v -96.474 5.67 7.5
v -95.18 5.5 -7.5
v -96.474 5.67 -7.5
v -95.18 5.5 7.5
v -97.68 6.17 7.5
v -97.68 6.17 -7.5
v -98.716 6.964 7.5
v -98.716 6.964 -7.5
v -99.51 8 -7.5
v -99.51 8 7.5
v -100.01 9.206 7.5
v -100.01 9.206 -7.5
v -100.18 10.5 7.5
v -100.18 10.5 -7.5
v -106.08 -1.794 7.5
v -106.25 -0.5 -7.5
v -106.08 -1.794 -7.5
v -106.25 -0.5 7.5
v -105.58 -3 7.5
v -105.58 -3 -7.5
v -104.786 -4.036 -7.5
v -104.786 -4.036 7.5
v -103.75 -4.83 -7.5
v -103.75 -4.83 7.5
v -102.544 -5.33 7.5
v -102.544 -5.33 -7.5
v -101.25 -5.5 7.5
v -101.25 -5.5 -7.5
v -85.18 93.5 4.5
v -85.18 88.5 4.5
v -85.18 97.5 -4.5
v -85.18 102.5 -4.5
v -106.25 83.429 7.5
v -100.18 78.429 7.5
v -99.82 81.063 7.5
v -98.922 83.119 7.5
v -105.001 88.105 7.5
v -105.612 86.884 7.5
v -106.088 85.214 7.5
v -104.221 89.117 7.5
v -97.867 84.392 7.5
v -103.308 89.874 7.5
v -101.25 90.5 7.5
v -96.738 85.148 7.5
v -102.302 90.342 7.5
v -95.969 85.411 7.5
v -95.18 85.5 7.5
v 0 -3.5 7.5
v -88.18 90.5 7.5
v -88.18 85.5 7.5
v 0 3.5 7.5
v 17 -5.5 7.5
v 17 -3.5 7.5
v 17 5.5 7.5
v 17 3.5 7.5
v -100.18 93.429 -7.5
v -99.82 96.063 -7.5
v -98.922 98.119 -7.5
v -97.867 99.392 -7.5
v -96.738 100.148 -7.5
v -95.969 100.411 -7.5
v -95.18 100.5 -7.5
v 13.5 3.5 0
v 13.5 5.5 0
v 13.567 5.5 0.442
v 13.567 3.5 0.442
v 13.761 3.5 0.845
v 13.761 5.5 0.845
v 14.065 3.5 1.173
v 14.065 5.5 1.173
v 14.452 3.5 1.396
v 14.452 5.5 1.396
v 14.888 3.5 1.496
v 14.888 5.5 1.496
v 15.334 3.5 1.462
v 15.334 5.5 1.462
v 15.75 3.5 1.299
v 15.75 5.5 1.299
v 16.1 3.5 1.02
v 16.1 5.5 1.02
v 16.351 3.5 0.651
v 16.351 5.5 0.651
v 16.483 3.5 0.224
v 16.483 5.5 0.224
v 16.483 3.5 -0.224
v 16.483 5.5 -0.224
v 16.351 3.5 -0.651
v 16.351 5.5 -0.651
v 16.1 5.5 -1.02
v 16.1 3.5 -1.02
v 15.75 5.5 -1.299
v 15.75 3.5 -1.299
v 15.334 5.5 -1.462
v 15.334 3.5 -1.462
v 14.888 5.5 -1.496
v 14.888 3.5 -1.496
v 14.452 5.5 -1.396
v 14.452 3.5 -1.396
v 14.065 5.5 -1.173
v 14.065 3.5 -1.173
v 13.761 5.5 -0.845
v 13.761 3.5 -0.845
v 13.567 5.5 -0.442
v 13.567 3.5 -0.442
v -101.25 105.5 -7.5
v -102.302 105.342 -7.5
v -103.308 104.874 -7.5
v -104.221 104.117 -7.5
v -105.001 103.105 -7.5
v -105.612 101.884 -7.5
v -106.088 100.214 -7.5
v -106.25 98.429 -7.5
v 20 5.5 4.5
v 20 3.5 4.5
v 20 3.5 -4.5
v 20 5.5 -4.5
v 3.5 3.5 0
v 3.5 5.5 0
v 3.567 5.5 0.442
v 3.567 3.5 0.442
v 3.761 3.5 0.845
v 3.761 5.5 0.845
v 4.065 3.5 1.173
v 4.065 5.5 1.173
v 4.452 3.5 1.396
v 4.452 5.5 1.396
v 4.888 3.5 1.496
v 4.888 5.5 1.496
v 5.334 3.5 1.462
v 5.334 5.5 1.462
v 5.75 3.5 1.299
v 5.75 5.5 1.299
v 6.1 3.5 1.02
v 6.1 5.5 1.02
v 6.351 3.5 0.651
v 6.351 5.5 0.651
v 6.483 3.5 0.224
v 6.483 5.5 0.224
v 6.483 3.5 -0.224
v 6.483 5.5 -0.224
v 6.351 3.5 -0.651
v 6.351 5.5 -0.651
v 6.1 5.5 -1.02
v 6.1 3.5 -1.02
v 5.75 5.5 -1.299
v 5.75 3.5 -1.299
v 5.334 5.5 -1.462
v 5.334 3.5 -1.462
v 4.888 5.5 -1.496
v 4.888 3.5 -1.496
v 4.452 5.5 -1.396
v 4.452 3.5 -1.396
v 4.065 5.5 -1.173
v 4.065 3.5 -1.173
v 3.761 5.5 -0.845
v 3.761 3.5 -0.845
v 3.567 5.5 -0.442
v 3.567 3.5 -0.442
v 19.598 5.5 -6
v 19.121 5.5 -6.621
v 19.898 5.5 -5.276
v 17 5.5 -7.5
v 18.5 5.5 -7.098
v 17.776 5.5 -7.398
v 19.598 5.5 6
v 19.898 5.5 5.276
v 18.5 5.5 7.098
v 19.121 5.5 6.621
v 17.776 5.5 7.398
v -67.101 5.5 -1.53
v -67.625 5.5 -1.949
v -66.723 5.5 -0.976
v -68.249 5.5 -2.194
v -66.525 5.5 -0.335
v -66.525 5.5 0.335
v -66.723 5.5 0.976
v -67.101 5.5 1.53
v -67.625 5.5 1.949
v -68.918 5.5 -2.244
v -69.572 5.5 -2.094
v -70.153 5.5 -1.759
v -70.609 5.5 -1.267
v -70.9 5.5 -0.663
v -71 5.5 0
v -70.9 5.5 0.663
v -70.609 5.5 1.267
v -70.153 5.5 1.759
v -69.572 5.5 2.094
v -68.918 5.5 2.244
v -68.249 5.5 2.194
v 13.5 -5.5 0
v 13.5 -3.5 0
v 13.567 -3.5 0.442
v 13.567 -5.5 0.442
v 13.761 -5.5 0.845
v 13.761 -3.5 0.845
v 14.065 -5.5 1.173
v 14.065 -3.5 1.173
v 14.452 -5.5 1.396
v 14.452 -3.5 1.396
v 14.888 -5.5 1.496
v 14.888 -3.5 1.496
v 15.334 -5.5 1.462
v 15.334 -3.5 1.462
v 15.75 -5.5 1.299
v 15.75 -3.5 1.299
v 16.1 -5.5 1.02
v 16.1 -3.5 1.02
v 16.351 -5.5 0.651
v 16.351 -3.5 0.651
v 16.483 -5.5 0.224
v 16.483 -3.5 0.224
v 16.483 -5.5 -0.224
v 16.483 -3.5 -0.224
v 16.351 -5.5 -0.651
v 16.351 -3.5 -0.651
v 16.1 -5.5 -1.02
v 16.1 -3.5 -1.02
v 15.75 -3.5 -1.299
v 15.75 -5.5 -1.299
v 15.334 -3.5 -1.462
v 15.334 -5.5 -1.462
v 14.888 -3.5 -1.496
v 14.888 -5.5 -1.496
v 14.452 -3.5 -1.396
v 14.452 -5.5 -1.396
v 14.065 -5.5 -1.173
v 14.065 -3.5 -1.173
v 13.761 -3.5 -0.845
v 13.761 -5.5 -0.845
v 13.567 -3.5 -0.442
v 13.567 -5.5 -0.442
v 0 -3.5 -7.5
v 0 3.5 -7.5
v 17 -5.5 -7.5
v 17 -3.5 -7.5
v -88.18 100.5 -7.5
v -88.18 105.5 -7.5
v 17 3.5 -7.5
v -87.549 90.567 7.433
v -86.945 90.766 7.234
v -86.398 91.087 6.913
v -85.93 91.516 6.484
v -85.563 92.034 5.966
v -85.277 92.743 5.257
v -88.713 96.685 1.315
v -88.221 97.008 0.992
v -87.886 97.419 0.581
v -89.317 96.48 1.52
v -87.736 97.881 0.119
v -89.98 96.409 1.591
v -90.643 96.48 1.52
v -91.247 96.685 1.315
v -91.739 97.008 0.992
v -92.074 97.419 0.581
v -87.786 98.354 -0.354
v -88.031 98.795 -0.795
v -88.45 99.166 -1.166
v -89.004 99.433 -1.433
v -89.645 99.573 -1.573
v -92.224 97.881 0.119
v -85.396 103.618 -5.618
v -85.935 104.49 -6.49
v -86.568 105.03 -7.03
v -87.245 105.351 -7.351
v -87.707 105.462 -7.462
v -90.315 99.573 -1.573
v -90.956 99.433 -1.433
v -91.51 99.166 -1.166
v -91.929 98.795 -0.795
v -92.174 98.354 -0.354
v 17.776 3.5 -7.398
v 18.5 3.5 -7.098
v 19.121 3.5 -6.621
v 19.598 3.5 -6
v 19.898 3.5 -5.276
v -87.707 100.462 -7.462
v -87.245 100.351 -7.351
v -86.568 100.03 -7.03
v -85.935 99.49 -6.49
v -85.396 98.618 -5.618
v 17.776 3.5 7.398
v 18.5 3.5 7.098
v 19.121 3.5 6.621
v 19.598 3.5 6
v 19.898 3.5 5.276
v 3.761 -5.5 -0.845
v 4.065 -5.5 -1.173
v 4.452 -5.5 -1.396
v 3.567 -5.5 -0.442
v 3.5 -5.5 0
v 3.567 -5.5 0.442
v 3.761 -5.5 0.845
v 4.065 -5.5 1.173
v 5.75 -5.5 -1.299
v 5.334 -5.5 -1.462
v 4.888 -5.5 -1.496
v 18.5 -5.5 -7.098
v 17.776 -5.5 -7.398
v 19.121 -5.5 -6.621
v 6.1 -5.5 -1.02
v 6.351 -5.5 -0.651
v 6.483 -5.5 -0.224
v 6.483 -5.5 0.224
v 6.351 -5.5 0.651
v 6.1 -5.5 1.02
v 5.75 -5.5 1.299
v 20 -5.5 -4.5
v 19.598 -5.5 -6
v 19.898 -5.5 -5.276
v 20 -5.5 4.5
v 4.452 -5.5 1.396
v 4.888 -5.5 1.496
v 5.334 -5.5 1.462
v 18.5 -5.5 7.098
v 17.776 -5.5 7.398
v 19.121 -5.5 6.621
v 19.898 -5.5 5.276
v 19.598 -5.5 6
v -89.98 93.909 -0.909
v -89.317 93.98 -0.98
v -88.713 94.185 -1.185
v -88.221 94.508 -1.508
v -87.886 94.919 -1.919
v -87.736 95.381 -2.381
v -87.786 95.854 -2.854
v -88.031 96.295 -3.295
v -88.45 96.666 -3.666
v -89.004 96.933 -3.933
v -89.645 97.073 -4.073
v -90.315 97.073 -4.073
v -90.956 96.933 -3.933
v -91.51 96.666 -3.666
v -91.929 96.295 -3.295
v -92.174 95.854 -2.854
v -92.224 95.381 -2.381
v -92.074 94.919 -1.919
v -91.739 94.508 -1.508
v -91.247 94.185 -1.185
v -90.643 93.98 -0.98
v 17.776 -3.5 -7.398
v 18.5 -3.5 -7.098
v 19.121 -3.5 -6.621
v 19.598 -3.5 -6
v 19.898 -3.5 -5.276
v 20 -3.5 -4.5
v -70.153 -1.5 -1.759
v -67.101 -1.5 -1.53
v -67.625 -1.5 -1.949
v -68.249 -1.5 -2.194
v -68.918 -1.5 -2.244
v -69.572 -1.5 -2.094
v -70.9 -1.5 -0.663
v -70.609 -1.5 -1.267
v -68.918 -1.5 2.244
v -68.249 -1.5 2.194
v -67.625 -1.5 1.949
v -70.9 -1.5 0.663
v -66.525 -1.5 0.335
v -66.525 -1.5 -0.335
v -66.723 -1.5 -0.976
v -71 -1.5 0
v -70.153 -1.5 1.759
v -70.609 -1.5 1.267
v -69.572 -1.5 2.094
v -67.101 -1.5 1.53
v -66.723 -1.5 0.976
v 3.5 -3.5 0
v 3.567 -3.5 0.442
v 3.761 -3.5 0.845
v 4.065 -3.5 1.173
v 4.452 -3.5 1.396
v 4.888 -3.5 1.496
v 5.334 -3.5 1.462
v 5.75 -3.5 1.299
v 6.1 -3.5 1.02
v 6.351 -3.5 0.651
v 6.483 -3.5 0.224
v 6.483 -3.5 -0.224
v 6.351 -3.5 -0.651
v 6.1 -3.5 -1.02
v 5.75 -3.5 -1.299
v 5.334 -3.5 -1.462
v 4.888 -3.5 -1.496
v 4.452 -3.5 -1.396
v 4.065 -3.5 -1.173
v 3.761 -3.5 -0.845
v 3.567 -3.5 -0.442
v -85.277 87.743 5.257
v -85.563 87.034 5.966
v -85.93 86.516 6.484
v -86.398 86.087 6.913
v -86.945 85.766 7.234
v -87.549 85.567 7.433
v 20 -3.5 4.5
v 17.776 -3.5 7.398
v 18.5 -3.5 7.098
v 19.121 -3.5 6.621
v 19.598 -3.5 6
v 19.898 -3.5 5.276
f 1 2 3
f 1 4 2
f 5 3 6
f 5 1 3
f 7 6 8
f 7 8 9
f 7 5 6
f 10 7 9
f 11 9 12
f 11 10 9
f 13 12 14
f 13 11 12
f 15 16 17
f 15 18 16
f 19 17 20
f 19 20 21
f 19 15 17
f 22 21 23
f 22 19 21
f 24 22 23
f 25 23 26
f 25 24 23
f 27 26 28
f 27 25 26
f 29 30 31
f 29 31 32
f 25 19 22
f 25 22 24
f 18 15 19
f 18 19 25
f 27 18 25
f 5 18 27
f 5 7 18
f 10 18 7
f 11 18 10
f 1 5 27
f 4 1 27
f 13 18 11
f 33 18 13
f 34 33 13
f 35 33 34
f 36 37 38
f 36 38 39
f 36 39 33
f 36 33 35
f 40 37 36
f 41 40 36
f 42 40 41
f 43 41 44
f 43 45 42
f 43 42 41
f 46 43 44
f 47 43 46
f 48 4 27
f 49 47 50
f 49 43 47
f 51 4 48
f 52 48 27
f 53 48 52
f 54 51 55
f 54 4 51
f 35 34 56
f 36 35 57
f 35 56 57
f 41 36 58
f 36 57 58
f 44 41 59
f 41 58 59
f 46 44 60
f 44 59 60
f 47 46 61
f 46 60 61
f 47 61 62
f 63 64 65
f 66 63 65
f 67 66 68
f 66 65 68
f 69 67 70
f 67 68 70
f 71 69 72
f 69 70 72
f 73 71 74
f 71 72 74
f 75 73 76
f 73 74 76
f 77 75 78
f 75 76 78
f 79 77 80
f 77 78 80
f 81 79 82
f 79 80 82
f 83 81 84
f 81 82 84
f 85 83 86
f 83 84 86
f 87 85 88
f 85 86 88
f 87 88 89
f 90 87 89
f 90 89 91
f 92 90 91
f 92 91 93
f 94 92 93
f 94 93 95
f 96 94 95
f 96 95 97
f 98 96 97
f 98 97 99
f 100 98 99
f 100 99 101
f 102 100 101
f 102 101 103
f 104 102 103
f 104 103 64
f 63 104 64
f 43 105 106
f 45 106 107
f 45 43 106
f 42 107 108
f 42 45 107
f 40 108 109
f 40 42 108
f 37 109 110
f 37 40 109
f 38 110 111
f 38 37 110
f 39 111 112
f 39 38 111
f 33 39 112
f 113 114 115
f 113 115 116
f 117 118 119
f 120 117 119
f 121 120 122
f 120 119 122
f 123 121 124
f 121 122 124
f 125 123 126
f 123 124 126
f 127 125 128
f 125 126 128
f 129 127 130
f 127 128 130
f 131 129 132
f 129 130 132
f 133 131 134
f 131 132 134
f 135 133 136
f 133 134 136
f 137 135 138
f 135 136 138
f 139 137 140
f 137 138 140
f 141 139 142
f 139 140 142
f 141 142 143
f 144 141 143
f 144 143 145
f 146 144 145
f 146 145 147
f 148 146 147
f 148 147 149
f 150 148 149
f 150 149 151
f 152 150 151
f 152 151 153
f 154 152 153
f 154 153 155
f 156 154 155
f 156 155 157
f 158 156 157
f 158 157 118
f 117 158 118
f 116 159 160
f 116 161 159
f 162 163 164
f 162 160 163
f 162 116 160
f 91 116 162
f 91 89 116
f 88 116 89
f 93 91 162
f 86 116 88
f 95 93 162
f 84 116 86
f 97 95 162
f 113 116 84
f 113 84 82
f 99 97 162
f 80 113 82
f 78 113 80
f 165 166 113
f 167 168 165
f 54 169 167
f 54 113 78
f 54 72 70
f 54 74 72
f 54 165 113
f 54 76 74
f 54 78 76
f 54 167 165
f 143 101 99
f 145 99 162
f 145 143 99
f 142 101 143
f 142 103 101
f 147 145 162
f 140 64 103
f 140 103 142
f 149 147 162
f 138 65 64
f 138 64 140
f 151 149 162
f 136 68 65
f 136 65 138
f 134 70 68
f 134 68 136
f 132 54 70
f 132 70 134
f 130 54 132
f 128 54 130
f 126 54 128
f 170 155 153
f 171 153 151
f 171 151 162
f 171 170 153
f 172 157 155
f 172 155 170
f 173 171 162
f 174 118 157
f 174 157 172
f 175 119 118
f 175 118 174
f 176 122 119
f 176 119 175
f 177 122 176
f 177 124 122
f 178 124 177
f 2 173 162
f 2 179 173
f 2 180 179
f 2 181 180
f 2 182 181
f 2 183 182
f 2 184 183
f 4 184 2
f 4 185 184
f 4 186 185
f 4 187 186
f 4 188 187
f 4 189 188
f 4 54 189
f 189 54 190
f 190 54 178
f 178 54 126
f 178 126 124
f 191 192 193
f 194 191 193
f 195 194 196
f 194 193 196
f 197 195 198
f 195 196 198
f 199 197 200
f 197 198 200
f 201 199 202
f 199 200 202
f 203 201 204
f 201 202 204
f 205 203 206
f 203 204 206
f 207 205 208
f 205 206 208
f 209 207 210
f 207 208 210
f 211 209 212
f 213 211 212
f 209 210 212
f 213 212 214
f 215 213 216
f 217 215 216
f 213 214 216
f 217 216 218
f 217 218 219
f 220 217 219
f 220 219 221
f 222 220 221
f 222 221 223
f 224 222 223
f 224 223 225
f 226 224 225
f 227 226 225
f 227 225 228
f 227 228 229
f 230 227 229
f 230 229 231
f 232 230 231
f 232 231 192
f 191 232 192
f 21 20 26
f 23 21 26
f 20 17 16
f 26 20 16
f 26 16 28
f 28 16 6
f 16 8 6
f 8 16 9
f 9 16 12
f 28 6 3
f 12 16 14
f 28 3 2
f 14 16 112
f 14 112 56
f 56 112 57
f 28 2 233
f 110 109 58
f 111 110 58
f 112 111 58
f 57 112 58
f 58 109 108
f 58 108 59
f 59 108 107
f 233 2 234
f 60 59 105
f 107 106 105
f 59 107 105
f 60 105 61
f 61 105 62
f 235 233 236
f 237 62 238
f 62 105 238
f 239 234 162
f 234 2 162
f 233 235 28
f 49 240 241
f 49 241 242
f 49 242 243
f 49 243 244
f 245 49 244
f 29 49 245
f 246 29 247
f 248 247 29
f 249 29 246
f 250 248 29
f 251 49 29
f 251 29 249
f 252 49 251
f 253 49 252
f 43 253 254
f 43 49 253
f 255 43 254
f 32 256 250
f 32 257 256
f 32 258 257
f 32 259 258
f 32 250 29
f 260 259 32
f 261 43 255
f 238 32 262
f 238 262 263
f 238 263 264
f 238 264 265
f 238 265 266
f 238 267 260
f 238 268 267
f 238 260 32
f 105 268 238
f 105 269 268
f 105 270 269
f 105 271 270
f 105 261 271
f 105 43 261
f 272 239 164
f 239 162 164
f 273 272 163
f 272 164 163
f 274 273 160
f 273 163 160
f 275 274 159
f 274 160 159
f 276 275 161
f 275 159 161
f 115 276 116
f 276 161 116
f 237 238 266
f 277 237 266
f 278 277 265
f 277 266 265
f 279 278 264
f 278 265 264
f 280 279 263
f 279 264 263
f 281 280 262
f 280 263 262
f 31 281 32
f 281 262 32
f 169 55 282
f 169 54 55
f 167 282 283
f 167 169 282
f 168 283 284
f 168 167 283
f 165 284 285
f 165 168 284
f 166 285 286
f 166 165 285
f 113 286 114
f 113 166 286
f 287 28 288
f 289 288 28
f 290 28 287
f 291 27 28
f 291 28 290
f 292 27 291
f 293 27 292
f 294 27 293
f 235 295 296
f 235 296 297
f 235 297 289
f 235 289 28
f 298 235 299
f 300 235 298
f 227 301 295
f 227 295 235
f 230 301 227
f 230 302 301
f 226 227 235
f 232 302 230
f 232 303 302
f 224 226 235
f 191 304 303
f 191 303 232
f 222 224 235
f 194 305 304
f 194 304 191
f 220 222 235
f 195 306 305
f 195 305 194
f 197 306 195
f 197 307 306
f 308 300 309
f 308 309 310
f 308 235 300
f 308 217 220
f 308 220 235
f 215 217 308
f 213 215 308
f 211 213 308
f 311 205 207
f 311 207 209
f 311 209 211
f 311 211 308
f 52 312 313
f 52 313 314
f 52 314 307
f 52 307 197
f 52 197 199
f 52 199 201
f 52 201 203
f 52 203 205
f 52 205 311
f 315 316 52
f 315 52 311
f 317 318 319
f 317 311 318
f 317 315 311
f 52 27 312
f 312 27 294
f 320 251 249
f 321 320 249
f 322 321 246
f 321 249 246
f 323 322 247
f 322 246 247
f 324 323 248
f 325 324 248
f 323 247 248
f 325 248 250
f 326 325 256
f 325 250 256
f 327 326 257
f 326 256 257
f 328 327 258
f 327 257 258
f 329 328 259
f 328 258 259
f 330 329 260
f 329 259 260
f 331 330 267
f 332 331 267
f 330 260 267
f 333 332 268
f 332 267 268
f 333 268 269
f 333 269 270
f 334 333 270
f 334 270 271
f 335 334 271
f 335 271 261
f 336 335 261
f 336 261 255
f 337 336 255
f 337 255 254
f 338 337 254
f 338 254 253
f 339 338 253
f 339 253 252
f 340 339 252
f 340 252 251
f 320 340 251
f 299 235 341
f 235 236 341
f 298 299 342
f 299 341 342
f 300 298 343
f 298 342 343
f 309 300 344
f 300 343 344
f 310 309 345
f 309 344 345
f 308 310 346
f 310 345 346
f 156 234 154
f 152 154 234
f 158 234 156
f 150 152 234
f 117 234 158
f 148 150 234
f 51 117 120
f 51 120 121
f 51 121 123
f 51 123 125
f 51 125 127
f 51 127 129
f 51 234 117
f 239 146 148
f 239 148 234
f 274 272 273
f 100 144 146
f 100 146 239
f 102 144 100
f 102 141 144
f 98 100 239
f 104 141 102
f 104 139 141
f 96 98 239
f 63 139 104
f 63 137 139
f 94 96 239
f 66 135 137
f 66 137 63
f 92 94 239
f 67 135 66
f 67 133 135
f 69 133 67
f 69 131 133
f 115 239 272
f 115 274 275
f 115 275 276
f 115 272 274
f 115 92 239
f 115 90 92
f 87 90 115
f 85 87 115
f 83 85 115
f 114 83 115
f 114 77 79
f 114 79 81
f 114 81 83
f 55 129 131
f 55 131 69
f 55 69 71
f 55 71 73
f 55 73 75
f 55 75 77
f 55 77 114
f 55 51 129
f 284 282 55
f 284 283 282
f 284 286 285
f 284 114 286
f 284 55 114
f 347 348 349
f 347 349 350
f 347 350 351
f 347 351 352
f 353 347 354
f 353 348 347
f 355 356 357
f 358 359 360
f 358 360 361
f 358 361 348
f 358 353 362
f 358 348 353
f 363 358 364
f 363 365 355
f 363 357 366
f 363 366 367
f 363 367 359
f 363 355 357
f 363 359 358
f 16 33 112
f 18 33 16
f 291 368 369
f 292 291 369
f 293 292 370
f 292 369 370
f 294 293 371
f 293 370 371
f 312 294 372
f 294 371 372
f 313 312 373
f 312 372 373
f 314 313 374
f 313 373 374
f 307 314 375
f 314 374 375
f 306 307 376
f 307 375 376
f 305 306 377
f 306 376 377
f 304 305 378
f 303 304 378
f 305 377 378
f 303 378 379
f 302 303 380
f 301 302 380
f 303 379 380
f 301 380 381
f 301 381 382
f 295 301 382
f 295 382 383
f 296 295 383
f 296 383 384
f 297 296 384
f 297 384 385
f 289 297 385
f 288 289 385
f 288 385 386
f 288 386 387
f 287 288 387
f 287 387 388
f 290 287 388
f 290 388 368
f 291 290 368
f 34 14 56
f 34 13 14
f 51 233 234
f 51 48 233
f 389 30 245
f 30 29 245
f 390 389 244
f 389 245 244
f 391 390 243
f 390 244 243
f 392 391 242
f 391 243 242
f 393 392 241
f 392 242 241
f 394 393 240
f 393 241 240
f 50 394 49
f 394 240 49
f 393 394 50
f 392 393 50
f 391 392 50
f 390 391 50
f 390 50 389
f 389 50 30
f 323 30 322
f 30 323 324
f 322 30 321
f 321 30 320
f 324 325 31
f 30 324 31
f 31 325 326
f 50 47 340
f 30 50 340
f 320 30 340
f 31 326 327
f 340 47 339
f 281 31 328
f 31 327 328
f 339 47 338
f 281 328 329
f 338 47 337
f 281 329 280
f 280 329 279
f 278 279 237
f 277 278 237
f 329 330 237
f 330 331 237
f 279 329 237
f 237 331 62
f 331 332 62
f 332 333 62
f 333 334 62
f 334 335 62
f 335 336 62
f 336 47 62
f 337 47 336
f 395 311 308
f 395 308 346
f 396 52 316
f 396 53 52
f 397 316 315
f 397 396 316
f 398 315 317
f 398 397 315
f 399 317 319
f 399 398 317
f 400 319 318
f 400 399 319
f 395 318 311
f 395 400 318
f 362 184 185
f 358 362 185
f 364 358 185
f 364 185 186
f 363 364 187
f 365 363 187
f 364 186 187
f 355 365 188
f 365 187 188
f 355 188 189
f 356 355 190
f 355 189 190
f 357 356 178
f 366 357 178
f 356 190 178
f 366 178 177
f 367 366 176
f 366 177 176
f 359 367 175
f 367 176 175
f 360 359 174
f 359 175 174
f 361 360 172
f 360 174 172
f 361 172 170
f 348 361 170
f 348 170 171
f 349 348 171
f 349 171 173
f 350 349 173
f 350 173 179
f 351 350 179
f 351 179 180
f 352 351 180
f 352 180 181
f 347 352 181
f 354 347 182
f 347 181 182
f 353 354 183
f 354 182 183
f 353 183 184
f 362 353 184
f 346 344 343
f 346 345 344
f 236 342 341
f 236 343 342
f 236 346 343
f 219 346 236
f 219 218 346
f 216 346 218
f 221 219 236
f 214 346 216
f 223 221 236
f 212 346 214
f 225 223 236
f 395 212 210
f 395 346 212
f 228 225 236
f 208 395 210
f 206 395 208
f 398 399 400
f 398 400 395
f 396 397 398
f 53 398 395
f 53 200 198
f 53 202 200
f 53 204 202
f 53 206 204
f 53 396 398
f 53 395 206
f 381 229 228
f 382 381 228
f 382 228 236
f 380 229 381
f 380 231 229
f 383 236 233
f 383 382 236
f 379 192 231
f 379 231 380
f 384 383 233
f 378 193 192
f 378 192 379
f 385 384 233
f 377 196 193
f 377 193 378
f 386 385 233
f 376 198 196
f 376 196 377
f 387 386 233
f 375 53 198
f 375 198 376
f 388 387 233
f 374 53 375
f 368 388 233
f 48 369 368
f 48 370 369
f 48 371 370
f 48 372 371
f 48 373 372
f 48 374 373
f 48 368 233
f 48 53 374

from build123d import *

# Parameters (mm, degrees)
SALIENTE_EXTRUIR1_DEPTH = 7.5
CROQUIS2_R              = 1.5
CORTAR_EXTRUIR1_DEPTH   = 147.100350787
REDONDEO1_R             = 3
REDONDEO2_R             = 3
CORTAR_EXTRUIR3_DEPTH   = 161.092886788
CROQUIS5_R              = 2.25
CORTAR_EXTRUIR4_DEPTH   = 133.941951618
CORTAR_EXTRUIR5_DEPTH   = 161.092886788
CROQUIS7_R              = 2.25
CORTAR_EXTRUIR6_DEPTH   = 7
REDONDEO3_R             = 5


with BuildPart() as part:
    # Croquis1 → Saliente-Extruir1 (new, symmetric)
    with BuildSketch(Plane.XY):
        Polygon((0, -3.5), (0, 3.5), (20, 3.5), (20, 5.5), (-100.18, 5.5), (-100.18, 85.5), (-85.18, 85.5), (-85.18, 105.5), (-106.25, 105.5), (-106.25, -5.5), (20, -5.5), (20, -3.5), align=None)
    extrude(amount=SALIENTE_EXTRUIR1_DEPTH, both=True)

    # Croquis2 → Cortar-Extruir1 (cut, through all)
    with BuildSketch(Plane(origin=(0, 5.5, 0), x_dir=(1, 0, 0), z_dir=(0, 1, 0))):
        with Locations(Location((15, 0, 0), (0, 0, 180))):
            Circle(CROQUIS2_R)
        with Locations(Location((5, 0, 0), (0, 0, 180))):
            Circle(CROQUIS2_R)
    extrude(amount=-CORTAR_EXTRUIR1_DEPTH, mode=Mode.SUBTRACT)

    # Redondeo1
    redondeo1_edges = [part.edges().sort_by_distance(p)[0] for p in [
        (20, -4.5, -7.5),
        (20, 4.5, -7.5),
        (20, 4.5, 7.5),
        (20, -4.5, 7.5),
    ]]
    fillet(redondeo1_edges, radius=REDONDEO1_R)

    # Redondeo2
    redondeo2_edges = [part.edges().sort_by_distance(p)[0] for p in [
        (-85.18, 95.5, -7.5),
        (-85.18, 95.5, 7.5),
    ]]
    fillet(redondeo2_edges, radius=REDONDEO2_R)

    # Croquis4 → Cortar-Extruir3 (cut, through all)
    with BuildSketch(Plane(origin=(-100.18, 0, 0), x_dir=(0, 0, -1), z_dir=(1, 0, 0))):
        Polygon((-7.5, 90.5), (7.5, 105.5), (-7.5, 105.5), align=None)
        Polygon((-7.5, 85.5), (7.5, 100.5), (7.5, 85.5), align=None)
    extrude(amount=CORTAR_EXTRUIR3_DEPTH, mode=Mode.SUBTRACT)

    # Croquis5 → Cortar-Extruir4 (cut, through all)
    with BuildSketch(Plane(origin=(0, 49, 49), x_dir=(1, 0, 0), z_dir=(0, 0.7071067811865464, 0.7071067811865488))):
        with Locations(Location((-89.98, 69.296464556, 0), (0, 0, 270))):
            Circle(CROQUIS5_R)
    extrude(amount=-CORTAR_EXTRUIR4_DEPTH, mode=Mode.SUBTRACT)

    # Croquis6 → Cortar-Extruir5 (cut, through all)
    with BuildSketch(Plane(origin=(-100.18, 0, 0), x_dir=(0, 0, -1), z_dir=(1, 0, 0))):
        Polygon((-7.5, 105.5), (-7.5, 90.5), (7.5, 105.5), align=None)
    extrude(amount=-CORTAR_EXTRUIR5_DEPTH, mode=Mode.SUBTRACT)

    # Croquis7 → Cortar-Extruir6 (cut)
    with BuildSketch(Plane(origin=(0, 5.5, 0), x_dir=(1, 0, 0), z_dir=(0, 1, 0))):
        with Locations(Location((-68.75, 0, 0), (0, 0, 180))):
            Circle(CROQUIS7_R)
    extrude(amount=-CORTAR_EXTRUIR6_DEPTH, mode=Mode.SUBTRACT)

    # Redondeo3
    redondeo3_edges = [part.edges().sort_by_distance(p)[0] for p in [
        (-100.18, 93, 0),
        (-106.25, 98, 0),
        (-106.25, -5.5, 0),
        (-100.18, 5.5, 0),
    ]]
    fillet(redondeo3_edges, radius=REDONDEO3_R)


solid = part.part
